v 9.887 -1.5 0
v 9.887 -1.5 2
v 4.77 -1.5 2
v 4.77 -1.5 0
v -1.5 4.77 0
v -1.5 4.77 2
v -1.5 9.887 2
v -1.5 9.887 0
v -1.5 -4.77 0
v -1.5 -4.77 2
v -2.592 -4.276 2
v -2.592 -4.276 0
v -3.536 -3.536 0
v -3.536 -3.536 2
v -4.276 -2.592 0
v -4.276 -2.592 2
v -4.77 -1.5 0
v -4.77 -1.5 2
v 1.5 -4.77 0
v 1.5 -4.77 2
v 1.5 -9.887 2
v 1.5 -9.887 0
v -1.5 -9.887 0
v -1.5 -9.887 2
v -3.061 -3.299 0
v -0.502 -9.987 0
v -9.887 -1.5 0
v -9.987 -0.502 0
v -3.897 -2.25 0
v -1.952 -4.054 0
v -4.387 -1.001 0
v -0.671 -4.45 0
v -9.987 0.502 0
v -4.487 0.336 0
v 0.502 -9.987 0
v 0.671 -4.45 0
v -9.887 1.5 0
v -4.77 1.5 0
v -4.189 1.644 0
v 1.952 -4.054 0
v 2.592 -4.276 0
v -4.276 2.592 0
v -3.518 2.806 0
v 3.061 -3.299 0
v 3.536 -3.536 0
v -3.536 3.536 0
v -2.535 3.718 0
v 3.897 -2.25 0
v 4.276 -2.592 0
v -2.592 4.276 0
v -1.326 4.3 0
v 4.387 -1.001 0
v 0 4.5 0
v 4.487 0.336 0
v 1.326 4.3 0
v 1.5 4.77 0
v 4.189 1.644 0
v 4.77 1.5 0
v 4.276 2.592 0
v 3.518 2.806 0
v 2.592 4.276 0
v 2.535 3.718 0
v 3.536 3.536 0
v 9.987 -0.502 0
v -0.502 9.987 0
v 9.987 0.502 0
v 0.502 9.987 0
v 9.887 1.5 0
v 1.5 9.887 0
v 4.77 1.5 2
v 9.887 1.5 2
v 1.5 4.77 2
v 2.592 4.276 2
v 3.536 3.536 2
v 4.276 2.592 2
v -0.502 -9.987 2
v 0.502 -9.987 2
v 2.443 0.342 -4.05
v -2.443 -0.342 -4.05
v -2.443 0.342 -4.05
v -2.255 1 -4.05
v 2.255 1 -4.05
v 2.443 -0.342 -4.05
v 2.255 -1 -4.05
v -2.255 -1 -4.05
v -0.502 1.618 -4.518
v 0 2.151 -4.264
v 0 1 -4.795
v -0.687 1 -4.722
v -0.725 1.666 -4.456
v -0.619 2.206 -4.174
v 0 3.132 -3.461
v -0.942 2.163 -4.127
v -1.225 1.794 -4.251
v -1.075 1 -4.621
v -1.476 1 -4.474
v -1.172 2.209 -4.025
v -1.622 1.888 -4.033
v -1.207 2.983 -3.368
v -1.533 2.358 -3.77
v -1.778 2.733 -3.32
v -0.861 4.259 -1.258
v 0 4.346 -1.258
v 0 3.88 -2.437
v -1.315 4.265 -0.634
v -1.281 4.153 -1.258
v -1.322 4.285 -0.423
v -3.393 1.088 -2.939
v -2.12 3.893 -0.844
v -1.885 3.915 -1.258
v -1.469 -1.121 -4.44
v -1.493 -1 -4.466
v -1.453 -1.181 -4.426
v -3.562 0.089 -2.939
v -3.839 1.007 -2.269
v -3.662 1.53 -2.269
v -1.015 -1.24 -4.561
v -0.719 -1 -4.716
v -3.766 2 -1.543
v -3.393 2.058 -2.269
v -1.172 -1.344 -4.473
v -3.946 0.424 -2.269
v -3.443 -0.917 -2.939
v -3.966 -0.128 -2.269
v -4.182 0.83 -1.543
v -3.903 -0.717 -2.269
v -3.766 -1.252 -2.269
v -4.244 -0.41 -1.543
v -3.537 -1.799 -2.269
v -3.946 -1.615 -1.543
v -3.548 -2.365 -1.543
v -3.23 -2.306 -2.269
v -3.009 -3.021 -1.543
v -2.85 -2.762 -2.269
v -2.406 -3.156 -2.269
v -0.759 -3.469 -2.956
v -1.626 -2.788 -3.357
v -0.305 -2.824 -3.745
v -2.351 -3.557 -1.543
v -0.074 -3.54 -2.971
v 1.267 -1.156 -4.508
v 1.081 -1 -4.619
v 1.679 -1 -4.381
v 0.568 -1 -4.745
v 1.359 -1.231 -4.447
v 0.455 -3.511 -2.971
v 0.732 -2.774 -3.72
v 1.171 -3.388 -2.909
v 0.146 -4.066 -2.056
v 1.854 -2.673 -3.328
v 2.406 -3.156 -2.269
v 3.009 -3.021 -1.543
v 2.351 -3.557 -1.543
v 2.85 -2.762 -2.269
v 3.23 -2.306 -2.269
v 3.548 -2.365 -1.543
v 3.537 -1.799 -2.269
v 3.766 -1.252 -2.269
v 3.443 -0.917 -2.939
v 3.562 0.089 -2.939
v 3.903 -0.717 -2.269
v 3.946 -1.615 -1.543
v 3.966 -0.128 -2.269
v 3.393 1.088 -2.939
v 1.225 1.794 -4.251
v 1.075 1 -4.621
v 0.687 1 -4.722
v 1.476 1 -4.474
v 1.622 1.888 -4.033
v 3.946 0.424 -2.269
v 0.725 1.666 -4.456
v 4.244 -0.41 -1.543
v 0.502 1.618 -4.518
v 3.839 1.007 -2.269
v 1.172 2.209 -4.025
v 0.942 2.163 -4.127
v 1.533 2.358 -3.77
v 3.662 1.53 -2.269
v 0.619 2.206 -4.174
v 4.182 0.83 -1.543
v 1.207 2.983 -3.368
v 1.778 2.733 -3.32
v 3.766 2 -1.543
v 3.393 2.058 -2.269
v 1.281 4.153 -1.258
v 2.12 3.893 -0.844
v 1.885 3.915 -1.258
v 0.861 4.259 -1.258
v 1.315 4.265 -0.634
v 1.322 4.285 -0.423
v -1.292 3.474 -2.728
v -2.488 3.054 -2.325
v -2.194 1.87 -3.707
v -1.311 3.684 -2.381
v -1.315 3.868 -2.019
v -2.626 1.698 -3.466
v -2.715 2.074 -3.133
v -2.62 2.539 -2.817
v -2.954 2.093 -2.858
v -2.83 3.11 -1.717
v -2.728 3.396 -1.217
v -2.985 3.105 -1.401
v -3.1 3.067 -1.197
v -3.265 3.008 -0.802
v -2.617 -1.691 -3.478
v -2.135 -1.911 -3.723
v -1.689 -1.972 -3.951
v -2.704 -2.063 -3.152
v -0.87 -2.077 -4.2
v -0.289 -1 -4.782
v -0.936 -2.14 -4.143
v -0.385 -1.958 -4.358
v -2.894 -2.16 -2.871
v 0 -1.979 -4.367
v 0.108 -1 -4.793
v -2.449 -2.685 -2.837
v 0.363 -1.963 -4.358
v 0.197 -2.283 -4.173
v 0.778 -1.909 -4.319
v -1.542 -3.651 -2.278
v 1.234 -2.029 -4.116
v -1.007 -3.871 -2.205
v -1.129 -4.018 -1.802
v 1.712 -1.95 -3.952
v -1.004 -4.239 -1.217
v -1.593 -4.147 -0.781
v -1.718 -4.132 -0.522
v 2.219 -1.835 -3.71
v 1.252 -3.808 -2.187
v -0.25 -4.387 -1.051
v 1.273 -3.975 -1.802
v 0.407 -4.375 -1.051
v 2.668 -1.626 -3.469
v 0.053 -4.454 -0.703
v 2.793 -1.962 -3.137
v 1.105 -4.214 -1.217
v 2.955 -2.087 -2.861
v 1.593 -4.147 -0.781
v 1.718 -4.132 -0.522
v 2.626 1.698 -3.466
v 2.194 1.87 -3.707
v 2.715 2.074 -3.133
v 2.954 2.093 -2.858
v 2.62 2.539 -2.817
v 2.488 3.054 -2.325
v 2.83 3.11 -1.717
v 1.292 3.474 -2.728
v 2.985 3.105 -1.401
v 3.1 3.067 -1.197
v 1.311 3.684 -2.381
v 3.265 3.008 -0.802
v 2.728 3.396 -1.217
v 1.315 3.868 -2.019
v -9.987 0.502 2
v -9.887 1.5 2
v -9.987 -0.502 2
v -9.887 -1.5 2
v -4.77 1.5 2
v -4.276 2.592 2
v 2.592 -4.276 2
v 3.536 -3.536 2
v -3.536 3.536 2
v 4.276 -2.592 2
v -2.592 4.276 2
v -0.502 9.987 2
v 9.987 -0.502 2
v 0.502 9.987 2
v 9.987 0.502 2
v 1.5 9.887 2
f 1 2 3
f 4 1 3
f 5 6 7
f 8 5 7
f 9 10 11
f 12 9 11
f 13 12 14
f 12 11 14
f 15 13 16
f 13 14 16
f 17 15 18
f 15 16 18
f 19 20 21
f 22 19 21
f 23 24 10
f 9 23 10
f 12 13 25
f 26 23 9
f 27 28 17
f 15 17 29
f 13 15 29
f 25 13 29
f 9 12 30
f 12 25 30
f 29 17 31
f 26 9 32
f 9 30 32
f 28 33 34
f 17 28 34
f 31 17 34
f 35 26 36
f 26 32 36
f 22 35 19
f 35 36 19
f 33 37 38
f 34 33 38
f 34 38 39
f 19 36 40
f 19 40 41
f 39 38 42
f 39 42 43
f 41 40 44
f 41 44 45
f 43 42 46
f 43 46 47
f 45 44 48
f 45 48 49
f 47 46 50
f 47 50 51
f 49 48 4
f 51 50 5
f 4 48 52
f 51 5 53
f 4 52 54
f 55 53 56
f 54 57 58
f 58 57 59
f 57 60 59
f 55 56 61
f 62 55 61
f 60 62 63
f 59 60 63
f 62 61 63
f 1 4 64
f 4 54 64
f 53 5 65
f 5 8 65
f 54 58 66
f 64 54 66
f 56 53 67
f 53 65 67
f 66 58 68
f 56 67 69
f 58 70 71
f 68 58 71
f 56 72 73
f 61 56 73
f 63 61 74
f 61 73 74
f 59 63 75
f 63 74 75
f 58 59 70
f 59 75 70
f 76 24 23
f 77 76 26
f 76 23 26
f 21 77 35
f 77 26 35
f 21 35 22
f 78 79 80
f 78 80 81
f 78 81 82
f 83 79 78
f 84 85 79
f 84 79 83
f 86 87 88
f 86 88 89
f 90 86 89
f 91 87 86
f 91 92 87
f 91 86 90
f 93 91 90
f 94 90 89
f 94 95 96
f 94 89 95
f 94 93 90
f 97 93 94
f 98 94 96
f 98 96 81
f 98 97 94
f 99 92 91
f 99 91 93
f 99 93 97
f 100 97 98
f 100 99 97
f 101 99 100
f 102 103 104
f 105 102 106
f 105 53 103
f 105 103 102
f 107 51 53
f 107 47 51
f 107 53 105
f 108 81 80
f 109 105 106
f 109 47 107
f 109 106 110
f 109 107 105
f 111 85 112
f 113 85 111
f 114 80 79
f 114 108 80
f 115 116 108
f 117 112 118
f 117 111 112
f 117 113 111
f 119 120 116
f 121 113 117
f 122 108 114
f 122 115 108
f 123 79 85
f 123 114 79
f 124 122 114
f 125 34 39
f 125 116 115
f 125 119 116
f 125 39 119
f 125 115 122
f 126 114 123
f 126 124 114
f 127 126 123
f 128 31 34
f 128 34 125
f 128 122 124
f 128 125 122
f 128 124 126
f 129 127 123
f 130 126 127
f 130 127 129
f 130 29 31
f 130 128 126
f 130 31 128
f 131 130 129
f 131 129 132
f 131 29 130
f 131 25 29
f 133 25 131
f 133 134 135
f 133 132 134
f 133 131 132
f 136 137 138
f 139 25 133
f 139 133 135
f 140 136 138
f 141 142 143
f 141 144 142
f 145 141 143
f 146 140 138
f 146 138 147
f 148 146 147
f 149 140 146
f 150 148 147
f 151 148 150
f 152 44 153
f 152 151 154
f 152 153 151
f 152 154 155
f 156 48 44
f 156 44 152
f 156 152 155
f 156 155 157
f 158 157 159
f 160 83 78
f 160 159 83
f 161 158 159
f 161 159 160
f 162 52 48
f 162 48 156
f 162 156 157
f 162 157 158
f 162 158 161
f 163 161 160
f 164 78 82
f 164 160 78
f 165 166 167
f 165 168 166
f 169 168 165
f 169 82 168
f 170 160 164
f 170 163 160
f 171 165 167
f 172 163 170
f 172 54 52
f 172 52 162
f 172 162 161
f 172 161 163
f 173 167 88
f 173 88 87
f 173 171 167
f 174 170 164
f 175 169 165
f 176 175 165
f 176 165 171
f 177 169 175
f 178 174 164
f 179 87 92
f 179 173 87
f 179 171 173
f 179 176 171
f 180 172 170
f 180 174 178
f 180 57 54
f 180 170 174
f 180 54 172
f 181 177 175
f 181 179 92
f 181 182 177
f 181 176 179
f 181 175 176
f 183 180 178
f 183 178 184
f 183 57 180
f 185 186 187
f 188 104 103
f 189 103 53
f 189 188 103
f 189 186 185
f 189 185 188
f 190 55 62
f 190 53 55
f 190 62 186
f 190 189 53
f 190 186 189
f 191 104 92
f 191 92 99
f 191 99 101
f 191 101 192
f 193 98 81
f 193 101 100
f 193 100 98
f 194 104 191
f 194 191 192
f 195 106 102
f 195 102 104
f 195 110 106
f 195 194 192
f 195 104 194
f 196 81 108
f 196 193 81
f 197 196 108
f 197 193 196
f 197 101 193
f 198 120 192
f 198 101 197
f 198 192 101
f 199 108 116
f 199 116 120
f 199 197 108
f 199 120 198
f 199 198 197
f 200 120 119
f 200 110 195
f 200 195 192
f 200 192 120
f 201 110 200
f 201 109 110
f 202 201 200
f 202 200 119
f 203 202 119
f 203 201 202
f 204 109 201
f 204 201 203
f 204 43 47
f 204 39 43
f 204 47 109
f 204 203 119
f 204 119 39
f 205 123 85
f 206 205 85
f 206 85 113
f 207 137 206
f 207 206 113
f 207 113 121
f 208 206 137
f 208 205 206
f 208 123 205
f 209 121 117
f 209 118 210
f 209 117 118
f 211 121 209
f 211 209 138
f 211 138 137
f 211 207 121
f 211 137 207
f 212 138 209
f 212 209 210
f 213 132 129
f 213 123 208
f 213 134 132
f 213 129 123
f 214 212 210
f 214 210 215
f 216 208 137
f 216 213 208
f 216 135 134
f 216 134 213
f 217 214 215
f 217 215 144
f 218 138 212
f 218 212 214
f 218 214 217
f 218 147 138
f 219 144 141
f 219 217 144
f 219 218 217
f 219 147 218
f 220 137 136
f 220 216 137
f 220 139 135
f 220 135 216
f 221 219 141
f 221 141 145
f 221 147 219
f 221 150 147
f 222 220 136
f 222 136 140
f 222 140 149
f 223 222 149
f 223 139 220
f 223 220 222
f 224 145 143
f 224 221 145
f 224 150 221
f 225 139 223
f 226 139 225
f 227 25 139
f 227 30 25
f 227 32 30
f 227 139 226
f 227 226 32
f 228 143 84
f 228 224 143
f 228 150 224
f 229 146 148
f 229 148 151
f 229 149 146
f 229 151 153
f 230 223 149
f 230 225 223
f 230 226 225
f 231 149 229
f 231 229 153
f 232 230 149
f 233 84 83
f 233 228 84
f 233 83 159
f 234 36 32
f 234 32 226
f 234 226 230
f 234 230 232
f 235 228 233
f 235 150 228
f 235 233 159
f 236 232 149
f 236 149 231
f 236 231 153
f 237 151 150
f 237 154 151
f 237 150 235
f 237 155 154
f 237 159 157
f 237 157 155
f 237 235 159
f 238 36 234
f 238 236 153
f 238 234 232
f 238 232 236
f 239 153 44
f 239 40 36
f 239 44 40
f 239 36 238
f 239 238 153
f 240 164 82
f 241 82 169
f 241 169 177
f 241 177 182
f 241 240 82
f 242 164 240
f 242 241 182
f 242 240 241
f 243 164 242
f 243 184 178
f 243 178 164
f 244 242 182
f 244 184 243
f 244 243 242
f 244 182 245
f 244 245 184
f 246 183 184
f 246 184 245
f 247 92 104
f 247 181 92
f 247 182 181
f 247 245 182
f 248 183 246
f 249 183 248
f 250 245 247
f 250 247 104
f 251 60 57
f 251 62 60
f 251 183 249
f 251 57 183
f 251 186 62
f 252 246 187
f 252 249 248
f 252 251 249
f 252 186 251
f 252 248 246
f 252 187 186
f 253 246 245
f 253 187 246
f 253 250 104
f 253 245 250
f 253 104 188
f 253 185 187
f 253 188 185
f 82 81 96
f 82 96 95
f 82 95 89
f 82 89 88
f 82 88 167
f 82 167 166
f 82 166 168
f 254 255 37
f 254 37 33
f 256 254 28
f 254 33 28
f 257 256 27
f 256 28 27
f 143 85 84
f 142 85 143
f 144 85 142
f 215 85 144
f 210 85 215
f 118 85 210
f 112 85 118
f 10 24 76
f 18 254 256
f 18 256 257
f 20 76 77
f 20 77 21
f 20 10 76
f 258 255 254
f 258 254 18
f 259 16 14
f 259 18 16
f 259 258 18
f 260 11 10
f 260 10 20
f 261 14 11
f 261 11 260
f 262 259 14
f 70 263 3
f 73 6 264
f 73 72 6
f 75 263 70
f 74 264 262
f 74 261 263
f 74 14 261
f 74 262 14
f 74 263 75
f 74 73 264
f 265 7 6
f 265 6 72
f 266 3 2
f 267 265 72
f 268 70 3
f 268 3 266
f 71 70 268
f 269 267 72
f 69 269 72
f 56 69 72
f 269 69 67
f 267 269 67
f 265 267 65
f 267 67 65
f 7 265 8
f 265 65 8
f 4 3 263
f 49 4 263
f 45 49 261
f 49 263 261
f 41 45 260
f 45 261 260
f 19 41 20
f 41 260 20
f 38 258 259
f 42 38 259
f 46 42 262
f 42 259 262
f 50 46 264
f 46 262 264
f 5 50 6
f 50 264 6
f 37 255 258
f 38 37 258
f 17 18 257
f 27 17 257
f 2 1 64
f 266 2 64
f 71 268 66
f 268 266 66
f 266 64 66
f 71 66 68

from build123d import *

# Parameters (mm, degrees)
F0_R     = 10
F1_DEPTH = 2
F3_DEPTH = 2.001
F6_W     = 6.3617299311
F6_H     = 2
F7_DEPTH = 1


with BuildPart() as f1:
    # F0 (on Top) → F1 (new body)
    with BuildSketch(Plane.XY):
        Circle(F0_R)
    extrude(amount=F1_DEPTH)

    # F2 (on face) → F3 (cut, through all)
    with BuildSketch(Plane.XY.offset(2)):
        with BuildLine():
            ThreePointArc((-4.7696960071, 1.5), (-3.5355339059, 3.5355339059), (-1.5, 4.7696960071))
            Line((-1.5, 4.7696960071), (-1.5, 9.8868599666))
            ThreePointArc((-1.5, 9.8868599666), (-7.0710678119, 7.0710678119), (-9.8868599666, 1.5))
            Line((-9.8868599666, 1.5), (-4.7696960071, 1.5))
        make_face()
        with BuildLine():
            ThreePointArc((1.5, 4.7696960071), (3.5355339059, 3.5355339059), (4.7696960071, 1.5))
            Line((4.7696960071, 1.5), (9.8868599666, 1.5))
            ThreePointArc((9.8868599666, 1.5), (7.0710678119, 7.0710678119), (1.5, 9.8868599666))
            Line((1.5, 9.8868599666), (1.5, 4.7696960071))
        make_face()
        with BuildLine():
            Line((9.8868599666, -1.5), (4.7696960071, -1.5))
            ThreePointArc((4.7696960071, -1.5), (3.5355339059, -3.5355339059), (1.5, -4.7696960071))
            Line((1.5, -4.7696960071), (1.5, -9.8868599666))
            ThreePointArc((1.5, -9.8868599666), (7.0710678119, -7.0710678119), (9.8868599666, -1.5))
        make_face()
        with BuildLine():
            Line((-1.5, -9.8868599666), (-1.5, -4.7696960071))
            ThreePointArc((-1.5, -4.7696960071), (-3.5355339059, -3.5355339059), (-4.7696960071, -1.5))
            Line((-4.7696960071, -1.5), (-9.8868599666, -1.5))
            ThreePointArc((-9.8868599666, -1.5), (-7.0710678119, -7.0710678119), (-1.5, -9.8868599666))
        make_face()
    extrude(amount=-F3_DEPTH, mode=Mode.SUBTRACT)

    # F4 (on Right) → F5 (revolve)
    with BuildSketch(Plane.YZ):
        with BuildLine():
            Line((4.5, 0), (0, 0))
            Line((0, 0), (0, -5))
            ThreePointArc((0, -5), (3.2165335145, -3.369880163), (4.5, 0))
        make_face()
    revolve(axis=Axis((0, 0, 2.0248414949), (0, 0, 1)))

    # F6 (on Front) → F7 (cut, symmetric)
    with BuildSketch(Plane.XZ):
        with Locations((0, -5.0499816425)):
            Rectangle(F6_W, F6_H)
    extrude(amount=F7_DEPTH, both=True, mode=Mode.SUBTRACT)


solid = f1.part
